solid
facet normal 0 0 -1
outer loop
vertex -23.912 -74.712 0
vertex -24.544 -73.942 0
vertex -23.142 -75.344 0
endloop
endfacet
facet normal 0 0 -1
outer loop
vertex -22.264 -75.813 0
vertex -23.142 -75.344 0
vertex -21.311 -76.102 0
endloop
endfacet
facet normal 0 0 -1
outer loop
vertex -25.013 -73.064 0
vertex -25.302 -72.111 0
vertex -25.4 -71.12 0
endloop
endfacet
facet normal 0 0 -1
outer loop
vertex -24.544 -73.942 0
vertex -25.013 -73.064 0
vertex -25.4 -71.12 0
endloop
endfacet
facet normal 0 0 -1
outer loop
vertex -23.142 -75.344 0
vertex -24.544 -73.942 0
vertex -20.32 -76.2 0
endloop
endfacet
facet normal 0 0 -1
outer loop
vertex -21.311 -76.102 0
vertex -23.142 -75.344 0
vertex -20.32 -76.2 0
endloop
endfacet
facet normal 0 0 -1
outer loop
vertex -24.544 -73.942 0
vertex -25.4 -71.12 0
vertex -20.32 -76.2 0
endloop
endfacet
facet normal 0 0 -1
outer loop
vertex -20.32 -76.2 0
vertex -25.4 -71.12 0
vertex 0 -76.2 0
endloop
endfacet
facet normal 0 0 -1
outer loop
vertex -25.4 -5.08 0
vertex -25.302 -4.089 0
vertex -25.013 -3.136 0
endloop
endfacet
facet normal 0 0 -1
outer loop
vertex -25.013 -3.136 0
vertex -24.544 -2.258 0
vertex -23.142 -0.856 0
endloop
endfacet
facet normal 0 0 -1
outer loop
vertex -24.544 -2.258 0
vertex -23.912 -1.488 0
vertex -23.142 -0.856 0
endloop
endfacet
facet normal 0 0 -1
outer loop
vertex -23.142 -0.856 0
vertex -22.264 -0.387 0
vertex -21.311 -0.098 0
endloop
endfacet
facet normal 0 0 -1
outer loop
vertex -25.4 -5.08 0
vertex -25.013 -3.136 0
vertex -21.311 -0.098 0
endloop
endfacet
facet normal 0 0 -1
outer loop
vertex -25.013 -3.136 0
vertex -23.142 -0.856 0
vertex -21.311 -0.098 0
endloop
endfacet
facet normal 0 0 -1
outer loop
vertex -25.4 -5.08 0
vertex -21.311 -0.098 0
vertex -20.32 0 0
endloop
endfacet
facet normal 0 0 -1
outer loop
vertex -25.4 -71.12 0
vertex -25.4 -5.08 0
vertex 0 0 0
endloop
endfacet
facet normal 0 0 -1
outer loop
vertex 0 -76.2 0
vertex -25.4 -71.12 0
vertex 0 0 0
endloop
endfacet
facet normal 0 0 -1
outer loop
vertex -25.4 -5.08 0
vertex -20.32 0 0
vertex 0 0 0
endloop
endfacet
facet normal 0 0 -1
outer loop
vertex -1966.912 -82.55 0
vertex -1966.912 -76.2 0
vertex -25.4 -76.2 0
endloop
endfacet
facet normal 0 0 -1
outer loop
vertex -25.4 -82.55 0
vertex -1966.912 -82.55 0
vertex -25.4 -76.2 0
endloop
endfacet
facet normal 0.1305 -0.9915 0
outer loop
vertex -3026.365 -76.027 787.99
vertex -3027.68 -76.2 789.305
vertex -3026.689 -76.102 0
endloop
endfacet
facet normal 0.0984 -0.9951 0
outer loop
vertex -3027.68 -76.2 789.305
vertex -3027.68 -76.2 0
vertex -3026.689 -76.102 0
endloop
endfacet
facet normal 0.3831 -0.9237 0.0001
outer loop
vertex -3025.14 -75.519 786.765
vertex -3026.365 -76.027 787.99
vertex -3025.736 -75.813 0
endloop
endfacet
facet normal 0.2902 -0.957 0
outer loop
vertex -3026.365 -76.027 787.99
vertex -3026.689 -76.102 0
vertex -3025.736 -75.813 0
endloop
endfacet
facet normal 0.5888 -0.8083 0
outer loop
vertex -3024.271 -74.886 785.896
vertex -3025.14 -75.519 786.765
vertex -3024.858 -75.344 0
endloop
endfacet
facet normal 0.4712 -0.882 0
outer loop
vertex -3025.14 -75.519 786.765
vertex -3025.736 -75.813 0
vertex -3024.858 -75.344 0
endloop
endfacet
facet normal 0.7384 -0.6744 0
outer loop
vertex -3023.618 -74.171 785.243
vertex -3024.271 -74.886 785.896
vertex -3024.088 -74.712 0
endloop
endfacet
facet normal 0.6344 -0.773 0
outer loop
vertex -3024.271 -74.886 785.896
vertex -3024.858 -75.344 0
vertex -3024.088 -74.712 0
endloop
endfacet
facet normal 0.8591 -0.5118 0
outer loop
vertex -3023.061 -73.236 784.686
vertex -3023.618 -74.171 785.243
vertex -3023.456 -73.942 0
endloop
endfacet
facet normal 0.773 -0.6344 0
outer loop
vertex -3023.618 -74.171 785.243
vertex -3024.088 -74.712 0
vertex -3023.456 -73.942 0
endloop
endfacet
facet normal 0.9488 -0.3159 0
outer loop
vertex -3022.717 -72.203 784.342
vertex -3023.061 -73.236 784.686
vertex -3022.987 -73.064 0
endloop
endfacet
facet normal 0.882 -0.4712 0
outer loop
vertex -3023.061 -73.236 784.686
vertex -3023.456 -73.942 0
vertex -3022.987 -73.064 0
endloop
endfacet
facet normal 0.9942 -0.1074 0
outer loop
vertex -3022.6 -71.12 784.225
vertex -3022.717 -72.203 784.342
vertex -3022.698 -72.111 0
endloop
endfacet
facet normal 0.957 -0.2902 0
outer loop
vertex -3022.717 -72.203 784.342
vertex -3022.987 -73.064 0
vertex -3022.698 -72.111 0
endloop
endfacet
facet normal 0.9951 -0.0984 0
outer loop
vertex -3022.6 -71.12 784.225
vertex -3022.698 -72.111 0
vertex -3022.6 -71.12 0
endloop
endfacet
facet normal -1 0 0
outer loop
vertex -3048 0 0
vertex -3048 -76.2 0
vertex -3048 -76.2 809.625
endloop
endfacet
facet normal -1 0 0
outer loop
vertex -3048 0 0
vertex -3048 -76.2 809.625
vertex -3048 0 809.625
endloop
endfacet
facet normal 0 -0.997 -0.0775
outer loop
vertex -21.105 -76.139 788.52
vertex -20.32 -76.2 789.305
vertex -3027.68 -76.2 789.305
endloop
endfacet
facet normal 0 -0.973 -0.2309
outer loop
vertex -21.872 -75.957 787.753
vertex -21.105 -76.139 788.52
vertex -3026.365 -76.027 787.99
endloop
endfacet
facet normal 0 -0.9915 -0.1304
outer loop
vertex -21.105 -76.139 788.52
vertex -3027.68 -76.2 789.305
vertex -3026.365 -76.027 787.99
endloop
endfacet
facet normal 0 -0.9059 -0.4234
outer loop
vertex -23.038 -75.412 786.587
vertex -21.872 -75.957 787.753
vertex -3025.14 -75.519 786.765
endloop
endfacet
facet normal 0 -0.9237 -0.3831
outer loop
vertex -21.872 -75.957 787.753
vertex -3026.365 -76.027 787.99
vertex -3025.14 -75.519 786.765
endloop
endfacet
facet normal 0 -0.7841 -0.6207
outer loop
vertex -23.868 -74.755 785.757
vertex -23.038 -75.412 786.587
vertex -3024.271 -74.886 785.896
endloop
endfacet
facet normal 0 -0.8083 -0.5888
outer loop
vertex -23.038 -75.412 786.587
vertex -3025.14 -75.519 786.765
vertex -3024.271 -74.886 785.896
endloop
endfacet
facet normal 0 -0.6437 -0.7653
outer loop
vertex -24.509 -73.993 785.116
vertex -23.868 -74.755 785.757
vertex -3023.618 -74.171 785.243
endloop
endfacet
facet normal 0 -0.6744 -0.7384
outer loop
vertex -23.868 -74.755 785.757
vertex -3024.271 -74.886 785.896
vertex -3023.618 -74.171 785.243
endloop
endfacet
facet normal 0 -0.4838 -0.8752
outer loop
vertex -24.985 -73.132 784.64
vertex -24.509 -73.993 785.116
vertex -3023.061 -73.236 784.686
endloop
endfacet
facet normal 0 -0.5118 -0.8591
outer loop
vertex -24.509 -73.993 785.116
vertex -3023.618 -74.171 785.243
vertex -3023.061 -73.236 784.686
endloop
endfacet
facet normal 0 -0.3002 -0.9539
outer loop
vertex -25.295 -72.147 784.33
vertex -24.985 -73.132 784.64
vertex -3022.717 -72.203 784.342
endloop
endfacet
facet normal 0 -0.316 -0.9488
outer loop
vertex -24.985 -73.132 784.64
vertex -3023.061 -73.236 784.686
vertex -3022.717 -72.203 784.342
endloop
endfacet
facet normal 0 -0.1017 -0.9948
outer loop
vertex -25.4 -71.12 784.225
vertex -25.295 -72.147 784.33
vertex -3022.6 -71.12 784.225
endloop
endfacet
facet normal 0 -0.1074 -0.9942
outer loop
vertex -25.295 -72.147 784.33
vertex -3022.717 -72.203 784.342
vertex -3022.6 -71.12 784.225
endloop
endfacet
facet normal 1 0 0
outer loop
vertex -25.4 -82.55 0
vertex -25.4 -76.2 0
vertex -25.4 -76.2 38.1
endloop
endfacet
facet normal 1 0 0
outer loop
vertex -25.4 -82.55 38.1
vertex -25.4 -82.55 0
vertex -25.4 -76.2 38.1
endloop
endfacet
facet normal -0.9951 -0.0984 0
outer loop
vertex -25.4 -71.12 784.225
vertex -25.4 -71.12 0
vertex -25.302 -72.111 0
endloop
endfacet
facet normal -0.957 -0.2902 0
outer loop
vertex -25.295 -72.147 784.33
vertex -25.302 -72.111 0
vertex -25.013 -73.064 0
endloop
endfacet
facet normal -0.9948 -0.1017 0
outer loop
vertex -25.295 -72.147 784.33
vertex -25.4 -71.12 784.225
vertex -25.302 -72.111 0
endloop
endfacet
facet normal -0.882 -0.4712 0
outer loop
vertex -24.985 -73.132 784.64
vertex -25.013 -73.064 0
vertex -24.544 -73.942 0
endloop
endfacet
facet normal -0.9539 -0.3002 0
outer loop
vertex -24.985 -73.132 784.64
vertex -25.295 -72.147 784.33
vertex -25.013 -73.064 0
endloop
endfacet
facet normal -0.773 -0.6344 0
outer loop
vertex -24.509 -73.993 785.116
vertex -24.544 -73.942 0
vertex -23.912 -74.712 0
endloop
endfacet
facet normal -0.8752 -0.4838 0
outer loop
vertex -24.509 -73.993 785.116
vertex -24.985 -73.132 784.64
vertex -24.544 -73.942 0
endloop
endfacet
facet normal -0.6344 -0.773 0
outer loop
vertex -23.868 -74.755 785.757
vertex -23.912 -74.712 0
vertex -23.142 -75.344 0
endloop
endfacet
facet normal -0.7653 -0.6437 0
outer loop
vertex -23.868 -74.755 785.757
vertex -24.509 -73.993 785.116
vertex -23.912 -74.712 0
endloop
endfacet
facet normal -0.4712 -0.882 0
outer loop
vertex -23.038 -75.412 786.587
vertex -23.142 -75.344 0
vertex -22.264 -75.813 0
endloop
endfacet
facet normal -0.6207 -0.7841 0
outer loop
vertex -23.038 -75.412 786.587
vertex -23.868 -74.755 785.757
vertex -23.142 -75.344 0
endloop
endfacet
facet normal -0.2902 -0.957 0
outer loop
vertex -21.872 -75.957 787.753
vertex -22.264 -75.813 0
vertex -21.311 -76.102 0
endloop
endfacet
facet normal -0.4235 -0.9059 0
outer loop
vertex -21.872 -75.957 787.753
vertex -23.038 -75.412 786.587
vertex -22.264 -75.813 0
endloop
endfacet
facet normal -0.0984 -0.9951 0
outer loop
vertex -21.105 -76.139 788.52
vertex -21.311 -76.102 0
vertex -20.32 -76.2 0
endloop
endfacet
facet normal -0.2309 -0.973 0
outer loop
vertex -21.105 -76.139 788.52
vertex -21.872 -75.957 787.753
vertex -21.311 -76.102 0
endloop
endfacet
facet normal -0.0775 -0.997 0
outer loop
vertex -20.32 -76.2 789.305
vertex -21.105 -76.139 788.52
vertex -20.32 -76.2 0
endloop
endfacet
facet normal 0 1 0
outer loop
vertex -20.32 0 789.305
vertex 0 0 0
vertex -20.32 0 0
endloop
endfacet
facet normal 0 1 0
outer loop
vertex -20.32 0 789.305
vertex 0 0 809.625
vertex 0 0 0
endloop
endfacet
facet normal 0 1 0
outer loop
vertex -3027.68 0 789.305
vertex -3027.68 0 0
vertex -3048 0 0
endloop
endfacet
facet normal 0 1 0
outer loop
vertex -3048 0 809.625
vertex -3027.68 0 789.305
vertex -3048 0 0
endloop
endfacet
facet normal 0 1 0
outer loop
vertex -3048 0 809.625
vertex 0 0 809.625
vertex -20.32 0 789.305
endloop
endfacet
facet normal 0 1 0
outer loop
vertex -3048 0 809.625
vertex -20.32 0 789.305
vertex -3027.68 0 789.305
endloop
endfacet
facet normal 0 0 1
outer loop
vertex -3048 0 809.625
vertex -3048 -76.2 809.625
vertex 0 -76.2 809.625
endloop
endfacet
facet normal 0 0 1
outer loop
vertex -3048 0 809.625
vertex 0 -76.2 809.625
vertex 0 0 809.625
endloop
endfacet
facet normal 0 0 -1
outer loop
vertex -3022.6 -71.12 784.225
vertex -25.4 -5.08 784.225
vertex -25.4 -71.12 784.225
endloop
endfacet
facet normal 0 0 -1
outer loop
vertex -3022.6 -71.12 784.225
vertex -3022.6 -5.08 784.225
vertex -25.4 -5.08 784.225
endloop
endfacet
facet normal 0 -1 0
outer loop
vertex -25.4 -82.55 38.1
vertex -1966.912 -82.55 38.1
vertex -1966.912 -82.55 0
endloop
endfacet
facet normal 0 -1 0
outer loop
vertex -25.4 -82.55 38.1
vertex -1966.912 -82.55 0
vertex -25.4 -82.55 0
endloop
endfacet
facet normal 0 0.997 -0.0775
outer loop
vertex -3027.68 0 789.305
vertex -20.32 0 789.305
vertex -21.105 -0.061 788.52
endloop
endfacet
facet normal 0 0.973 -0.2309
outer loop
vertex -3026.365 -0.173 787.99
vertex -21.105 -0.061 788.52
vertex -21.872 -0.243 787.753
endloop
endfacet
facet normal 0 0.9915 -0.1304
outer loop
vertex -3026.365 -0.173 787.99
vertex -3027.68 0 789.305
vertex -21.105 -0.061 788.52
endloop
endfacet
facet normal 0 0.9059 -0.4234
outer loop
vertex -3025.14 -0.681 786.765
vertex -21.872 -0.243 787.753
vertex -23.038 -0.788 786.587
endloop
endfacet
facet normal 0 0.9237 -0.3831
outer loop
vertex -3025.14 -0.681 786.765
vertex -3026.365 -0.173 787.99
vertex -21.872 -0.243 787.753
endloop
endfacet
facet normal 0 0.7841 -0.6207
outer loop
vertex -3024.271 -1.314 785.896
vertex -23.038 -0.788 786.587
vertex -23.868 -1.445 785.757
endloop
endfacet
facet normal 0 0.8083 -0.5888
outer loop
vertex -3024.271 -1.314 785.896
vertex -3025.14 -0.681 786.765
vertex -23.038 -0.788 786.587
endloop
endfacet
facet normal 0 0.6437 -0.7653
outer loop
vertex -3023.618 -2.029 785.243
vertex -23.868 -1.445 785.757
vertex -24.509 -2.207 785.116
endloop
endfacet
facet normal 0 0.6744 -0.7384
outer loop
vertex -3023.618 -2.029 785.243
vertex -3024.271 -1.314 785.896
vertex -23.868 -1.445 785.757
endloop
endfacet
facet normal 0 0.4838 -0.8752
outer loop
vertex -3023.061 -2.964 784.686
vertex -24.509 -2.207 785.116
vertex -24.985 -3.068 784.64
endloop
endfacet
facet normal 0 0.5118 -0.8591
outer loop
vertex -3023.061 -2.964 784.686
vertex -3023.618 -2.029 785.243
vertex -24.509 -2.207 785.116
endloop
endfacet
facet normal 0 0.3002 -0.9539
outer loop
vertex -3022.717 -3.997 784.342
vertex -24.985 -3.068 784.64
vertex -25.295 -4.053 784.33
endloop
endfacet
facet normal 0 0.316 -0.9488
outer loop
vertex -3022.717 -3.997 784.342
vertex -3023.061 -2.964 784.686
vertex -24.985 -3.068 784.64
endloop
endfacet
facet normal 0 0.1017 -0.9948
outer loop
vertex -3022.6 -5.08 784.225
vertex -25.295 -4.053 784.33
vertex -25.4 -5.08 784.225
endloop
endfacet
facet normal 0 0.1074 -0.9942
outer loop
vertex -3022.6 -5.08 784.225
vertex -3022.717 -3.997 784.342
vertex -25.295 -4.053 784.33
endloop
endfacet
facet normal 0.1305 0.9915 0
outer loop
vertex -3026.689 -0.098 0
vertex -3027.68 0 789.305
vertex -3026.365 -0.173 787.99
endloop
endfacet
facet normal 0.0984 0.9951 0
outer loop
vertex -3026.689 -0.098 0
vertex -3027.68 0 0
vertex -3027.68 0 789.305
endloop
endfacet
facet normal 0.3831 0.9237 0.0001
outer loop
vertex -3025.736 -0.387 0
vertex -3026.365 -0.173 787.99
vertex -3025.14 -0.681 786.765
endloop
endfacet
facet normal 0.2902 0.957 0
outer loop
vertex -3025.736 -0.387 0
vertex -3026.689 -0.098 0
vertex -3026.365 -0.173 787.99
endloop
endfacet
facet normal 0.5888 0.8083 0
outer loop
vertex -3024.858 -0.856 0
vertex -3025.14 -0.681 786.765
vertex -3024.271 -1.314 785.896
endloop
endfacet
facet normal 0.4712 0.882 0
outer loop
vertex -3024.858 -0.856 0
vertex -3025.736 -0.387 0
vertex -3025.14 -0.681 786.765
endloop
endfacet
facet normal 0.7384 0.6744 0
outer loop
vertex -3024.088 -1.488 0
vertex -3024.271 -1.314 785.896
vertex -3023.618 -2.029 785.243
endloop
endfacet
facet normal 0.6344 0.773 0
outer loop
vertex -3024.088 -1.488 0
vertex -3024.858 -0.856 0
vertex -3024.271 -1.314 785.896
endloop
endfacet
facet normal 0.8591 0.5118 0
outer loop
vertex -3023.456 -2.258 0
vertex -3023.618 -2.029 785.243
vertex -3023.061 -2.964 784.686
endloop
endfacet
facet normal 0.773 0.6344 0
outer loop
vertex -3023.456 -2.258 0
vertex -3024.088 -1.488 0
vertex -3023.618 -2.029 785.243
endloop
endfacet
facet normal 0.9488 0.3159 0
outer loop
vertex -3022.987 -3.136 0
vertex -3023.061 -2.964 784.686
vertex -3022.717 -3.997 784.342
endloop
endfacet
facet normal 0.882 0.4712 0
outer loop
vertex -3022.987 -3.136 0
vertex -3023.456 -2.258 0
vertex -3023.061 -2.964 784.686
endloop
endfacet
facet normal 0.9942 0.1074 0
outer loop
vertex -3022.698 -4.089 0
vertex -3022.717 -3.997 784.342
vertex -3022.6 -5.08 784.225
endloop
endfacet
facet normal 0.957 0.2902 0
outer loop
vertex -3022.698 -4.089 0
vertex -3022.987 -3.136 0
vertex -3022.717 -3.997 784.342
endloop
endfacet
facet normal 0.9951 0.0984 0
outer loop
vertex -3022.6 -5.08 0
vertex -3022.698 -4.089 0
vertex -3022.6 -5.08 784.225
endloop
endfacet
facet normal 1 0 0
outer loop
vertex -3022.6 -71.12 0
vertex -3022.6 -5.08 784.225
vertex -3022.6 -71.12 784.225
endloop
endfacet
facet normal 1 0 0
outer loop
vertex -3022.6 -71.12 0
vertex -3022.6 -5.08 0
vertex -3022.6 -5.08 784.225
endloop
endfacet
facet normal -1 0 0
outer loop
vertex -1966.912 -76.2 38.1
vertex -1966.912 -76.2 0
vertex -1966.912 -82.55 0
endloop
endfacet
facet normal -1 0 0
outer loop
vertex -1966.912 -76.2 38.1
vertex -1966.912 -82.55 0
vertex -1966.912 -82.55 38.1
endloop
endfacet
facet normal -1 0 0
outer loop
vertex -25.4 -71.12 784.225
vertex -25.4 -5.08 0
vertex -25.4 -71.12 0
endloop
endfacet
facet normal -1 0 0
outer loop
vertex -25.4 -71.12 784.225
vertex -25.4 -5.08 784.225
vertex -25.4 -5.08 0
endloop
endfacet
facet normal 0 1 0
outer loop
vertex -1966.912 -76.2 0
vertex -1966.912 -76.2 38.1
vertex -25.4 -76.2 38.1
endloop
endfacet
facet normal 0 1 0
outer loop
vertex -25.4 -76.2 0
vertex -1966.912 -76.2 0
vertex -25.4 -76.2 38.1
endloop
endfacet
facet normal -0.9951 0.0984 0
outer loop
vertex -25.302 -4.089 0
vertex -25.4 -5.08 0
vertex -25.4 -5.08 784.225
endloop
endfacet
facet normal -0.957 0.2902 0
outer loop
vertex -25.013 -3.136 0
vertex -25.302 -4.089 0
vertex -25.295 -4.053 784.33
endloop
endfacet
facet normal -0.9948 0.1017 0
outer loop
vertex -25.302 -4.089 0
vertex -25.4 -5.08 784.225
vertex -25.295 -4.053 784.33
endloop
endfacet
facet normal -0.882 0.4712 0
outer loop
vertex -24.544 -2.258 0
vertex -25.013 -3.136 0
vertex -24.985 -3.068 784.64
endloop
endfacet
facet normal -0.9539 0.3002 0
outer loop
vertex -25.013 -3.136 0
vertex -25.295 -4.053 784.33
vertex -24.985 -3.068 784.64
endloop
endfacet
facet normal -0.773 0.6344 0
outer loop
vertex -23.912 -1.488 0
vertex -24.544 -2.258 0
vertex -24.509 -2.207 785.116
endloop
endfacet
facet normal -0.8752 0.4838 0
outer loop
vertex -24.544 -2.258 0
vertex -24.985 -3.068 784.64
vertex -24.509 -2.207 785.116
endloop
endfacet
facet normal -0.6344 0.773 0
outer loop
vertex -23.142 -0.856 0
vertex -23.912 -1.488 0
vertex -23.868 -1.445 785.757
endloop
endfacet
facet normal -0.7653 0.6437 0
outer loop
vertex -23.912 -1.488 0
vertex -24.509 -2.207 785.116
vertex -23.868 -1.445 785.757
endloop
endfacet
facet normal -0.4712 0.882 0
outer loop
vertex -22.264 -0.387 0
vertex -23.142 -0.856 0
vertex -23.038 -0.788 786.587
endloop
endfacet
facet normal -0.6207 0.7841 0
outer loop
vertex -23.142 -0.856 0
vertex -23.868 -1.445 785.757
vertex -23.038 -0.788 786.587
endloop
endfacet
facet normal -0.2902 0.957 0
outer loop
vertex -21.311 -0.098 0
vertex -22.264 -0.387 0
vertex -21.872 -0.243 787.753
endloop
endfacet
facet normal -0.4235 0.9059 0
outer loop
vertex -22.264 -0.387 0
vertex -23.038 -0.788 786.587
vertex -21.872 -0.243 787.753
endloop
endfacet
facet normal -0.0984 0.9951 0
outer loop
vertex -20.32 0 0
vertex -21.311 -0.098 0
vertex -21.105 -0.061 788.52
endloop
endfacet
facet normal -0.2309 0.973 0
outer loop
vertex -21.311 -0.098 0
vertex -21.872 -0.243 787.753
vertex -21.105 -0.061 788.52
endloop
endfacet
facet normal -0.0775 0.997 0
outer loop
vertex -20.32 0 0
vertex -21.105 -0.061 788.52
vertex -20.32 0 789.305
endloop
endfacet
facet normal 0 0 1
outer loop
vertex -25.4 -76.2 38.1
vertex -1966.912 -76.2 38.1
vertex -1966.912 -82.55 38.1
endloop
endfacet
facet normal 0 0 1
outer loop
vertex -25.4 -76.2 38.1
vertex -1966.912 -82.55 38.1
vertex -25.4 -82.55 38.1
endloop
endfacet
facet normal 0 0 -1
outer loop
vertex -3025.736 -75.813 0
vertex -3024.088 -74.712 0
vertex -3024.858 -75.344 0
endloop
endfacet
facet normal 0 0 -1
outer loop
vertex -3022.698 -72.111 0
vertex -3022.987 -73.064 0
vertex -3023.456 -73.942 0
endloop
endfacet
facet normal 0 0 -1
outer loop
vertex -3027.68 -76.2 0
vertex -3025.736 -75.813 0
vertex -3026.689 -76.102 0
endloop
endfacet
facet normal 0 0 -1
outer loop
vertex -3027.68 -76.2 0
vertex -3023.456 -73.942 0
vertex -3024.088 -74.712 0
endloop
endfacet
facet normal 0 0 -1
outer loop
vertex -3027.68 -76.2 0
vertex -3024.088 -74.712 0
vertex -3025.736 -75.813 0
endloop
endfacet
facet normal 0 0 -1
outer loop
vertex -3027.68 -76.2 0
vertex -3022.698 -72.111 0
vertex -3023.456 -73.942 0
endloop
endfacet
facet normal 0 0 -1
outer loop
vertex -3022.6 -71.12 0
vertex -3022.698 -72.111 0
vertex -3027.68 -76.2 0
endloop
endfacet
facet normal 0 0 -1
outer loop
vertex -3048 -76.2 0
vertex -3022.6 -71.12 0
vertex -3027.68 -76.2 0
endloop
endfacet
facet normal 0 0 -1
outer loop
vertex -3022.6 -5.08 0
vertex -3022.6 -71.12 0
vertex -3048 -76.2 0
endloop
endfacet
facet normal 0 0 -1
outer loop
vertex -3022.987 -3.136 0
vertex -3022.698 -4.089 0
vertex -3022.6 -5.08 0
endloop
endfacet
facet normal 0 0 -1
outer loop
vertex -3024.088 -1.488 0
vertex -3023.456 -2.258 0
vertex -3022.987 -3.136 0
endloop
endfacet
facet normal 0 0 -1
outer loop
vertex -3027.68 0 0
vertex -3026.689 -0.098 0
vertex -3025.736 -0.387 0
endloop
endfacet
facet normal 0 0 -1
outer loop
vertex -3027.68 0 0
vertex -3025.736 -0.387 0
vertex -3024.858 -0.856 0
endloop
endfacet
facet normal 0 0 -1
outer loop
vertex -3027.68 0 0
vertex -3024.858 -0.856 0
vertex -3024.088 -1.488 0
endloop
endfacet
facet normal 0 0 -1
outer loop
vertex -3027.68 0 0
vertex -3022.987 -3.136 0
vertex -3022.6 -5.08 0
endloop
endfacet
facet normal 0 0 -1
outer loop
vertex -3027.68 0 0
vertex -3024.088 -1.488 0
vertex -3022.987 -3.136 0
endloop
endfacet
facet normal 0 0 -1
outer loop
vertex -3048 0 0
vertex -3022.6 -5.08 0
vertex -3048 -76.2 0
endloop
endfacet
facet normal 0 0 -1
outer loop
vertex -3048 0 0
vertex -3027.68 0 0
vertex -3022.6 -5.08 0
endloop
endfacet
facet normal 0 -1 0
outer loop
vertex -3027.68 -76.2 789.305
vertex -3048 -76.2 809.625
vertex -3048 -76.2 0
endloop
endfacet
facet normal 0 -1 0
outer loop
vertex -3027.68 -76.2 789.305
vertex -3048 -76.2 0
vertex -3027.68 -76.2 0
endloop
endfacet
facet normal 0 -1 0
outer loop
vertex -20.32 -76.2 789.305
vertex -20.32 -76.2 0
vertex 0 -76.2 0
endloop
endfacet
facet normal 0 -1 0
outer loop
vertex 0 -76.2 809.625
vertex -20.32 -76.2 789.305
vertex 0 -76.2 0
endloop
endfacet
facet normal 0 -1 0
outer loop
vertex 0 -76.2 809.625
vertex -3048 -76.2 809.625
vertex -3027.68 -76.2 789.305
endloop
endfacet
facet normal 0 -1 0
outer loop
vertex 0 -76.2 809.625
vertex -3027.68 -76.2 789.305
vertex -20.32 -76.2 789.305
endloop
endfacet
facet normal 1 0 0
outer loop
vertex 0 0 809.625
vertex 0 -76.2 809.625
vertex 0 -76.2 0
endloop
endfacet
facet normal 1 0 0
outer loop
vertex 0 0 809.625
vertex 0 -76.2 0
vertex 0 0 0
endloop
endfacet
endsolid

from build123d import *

# Parameters (mm, degrees)
F1_W     = 25.4
F1_H     = 76.2
F4_R     = 5.08
F3_W     = 1941.5125
F3_H     = 38.1
F5_DEPTH = 6.35


with BuildPart() as f2:
    # F2: sweep along a path in F0
    with BuildLine(Plane.XZ) as f2_path:
        Line((0, 0), (0, 809.625))
        Line((0, 809.625), (-3048, 809.625))
        Line((-3048, 809.625), (-3048, 0))
    # F1 (on Top) → F2 (sweep)
    with BuildSketch(Plane.XY):
        with Locations((-12.7, -38.1)):
            Rectangle(F1_W, F1_H)
    sweep(path=f2_path.line, transition=Transition.RIGHT)

    # F4
    f4_edges = [f2.edges().sort_by_distance(p)[0] for p in [
        (-25.4, 0, 392.1125),
        (-25.4, -76.2, 392.1125),
        (-1524, 0, 784.225),
        (-1524, -76.2, 784.225),
        (-3022.6, 0, 392.1125),
        (-3022.6, -76.2, 392.1125),
    ]]
    fillet(f4_edges, radius=F4_R)


with BuildPart() as f5:
    # F3 (on face) → F5 (new body)
    with BuildSketch(Plane.XZ.offset(76.2)):
        with Locations((-996.15625, 19.05)):
            Rectangle(F3_W, F3_H)
    extrude(amount=F5_DEPTH)


solid = Compound([f2.part, f5.part])
